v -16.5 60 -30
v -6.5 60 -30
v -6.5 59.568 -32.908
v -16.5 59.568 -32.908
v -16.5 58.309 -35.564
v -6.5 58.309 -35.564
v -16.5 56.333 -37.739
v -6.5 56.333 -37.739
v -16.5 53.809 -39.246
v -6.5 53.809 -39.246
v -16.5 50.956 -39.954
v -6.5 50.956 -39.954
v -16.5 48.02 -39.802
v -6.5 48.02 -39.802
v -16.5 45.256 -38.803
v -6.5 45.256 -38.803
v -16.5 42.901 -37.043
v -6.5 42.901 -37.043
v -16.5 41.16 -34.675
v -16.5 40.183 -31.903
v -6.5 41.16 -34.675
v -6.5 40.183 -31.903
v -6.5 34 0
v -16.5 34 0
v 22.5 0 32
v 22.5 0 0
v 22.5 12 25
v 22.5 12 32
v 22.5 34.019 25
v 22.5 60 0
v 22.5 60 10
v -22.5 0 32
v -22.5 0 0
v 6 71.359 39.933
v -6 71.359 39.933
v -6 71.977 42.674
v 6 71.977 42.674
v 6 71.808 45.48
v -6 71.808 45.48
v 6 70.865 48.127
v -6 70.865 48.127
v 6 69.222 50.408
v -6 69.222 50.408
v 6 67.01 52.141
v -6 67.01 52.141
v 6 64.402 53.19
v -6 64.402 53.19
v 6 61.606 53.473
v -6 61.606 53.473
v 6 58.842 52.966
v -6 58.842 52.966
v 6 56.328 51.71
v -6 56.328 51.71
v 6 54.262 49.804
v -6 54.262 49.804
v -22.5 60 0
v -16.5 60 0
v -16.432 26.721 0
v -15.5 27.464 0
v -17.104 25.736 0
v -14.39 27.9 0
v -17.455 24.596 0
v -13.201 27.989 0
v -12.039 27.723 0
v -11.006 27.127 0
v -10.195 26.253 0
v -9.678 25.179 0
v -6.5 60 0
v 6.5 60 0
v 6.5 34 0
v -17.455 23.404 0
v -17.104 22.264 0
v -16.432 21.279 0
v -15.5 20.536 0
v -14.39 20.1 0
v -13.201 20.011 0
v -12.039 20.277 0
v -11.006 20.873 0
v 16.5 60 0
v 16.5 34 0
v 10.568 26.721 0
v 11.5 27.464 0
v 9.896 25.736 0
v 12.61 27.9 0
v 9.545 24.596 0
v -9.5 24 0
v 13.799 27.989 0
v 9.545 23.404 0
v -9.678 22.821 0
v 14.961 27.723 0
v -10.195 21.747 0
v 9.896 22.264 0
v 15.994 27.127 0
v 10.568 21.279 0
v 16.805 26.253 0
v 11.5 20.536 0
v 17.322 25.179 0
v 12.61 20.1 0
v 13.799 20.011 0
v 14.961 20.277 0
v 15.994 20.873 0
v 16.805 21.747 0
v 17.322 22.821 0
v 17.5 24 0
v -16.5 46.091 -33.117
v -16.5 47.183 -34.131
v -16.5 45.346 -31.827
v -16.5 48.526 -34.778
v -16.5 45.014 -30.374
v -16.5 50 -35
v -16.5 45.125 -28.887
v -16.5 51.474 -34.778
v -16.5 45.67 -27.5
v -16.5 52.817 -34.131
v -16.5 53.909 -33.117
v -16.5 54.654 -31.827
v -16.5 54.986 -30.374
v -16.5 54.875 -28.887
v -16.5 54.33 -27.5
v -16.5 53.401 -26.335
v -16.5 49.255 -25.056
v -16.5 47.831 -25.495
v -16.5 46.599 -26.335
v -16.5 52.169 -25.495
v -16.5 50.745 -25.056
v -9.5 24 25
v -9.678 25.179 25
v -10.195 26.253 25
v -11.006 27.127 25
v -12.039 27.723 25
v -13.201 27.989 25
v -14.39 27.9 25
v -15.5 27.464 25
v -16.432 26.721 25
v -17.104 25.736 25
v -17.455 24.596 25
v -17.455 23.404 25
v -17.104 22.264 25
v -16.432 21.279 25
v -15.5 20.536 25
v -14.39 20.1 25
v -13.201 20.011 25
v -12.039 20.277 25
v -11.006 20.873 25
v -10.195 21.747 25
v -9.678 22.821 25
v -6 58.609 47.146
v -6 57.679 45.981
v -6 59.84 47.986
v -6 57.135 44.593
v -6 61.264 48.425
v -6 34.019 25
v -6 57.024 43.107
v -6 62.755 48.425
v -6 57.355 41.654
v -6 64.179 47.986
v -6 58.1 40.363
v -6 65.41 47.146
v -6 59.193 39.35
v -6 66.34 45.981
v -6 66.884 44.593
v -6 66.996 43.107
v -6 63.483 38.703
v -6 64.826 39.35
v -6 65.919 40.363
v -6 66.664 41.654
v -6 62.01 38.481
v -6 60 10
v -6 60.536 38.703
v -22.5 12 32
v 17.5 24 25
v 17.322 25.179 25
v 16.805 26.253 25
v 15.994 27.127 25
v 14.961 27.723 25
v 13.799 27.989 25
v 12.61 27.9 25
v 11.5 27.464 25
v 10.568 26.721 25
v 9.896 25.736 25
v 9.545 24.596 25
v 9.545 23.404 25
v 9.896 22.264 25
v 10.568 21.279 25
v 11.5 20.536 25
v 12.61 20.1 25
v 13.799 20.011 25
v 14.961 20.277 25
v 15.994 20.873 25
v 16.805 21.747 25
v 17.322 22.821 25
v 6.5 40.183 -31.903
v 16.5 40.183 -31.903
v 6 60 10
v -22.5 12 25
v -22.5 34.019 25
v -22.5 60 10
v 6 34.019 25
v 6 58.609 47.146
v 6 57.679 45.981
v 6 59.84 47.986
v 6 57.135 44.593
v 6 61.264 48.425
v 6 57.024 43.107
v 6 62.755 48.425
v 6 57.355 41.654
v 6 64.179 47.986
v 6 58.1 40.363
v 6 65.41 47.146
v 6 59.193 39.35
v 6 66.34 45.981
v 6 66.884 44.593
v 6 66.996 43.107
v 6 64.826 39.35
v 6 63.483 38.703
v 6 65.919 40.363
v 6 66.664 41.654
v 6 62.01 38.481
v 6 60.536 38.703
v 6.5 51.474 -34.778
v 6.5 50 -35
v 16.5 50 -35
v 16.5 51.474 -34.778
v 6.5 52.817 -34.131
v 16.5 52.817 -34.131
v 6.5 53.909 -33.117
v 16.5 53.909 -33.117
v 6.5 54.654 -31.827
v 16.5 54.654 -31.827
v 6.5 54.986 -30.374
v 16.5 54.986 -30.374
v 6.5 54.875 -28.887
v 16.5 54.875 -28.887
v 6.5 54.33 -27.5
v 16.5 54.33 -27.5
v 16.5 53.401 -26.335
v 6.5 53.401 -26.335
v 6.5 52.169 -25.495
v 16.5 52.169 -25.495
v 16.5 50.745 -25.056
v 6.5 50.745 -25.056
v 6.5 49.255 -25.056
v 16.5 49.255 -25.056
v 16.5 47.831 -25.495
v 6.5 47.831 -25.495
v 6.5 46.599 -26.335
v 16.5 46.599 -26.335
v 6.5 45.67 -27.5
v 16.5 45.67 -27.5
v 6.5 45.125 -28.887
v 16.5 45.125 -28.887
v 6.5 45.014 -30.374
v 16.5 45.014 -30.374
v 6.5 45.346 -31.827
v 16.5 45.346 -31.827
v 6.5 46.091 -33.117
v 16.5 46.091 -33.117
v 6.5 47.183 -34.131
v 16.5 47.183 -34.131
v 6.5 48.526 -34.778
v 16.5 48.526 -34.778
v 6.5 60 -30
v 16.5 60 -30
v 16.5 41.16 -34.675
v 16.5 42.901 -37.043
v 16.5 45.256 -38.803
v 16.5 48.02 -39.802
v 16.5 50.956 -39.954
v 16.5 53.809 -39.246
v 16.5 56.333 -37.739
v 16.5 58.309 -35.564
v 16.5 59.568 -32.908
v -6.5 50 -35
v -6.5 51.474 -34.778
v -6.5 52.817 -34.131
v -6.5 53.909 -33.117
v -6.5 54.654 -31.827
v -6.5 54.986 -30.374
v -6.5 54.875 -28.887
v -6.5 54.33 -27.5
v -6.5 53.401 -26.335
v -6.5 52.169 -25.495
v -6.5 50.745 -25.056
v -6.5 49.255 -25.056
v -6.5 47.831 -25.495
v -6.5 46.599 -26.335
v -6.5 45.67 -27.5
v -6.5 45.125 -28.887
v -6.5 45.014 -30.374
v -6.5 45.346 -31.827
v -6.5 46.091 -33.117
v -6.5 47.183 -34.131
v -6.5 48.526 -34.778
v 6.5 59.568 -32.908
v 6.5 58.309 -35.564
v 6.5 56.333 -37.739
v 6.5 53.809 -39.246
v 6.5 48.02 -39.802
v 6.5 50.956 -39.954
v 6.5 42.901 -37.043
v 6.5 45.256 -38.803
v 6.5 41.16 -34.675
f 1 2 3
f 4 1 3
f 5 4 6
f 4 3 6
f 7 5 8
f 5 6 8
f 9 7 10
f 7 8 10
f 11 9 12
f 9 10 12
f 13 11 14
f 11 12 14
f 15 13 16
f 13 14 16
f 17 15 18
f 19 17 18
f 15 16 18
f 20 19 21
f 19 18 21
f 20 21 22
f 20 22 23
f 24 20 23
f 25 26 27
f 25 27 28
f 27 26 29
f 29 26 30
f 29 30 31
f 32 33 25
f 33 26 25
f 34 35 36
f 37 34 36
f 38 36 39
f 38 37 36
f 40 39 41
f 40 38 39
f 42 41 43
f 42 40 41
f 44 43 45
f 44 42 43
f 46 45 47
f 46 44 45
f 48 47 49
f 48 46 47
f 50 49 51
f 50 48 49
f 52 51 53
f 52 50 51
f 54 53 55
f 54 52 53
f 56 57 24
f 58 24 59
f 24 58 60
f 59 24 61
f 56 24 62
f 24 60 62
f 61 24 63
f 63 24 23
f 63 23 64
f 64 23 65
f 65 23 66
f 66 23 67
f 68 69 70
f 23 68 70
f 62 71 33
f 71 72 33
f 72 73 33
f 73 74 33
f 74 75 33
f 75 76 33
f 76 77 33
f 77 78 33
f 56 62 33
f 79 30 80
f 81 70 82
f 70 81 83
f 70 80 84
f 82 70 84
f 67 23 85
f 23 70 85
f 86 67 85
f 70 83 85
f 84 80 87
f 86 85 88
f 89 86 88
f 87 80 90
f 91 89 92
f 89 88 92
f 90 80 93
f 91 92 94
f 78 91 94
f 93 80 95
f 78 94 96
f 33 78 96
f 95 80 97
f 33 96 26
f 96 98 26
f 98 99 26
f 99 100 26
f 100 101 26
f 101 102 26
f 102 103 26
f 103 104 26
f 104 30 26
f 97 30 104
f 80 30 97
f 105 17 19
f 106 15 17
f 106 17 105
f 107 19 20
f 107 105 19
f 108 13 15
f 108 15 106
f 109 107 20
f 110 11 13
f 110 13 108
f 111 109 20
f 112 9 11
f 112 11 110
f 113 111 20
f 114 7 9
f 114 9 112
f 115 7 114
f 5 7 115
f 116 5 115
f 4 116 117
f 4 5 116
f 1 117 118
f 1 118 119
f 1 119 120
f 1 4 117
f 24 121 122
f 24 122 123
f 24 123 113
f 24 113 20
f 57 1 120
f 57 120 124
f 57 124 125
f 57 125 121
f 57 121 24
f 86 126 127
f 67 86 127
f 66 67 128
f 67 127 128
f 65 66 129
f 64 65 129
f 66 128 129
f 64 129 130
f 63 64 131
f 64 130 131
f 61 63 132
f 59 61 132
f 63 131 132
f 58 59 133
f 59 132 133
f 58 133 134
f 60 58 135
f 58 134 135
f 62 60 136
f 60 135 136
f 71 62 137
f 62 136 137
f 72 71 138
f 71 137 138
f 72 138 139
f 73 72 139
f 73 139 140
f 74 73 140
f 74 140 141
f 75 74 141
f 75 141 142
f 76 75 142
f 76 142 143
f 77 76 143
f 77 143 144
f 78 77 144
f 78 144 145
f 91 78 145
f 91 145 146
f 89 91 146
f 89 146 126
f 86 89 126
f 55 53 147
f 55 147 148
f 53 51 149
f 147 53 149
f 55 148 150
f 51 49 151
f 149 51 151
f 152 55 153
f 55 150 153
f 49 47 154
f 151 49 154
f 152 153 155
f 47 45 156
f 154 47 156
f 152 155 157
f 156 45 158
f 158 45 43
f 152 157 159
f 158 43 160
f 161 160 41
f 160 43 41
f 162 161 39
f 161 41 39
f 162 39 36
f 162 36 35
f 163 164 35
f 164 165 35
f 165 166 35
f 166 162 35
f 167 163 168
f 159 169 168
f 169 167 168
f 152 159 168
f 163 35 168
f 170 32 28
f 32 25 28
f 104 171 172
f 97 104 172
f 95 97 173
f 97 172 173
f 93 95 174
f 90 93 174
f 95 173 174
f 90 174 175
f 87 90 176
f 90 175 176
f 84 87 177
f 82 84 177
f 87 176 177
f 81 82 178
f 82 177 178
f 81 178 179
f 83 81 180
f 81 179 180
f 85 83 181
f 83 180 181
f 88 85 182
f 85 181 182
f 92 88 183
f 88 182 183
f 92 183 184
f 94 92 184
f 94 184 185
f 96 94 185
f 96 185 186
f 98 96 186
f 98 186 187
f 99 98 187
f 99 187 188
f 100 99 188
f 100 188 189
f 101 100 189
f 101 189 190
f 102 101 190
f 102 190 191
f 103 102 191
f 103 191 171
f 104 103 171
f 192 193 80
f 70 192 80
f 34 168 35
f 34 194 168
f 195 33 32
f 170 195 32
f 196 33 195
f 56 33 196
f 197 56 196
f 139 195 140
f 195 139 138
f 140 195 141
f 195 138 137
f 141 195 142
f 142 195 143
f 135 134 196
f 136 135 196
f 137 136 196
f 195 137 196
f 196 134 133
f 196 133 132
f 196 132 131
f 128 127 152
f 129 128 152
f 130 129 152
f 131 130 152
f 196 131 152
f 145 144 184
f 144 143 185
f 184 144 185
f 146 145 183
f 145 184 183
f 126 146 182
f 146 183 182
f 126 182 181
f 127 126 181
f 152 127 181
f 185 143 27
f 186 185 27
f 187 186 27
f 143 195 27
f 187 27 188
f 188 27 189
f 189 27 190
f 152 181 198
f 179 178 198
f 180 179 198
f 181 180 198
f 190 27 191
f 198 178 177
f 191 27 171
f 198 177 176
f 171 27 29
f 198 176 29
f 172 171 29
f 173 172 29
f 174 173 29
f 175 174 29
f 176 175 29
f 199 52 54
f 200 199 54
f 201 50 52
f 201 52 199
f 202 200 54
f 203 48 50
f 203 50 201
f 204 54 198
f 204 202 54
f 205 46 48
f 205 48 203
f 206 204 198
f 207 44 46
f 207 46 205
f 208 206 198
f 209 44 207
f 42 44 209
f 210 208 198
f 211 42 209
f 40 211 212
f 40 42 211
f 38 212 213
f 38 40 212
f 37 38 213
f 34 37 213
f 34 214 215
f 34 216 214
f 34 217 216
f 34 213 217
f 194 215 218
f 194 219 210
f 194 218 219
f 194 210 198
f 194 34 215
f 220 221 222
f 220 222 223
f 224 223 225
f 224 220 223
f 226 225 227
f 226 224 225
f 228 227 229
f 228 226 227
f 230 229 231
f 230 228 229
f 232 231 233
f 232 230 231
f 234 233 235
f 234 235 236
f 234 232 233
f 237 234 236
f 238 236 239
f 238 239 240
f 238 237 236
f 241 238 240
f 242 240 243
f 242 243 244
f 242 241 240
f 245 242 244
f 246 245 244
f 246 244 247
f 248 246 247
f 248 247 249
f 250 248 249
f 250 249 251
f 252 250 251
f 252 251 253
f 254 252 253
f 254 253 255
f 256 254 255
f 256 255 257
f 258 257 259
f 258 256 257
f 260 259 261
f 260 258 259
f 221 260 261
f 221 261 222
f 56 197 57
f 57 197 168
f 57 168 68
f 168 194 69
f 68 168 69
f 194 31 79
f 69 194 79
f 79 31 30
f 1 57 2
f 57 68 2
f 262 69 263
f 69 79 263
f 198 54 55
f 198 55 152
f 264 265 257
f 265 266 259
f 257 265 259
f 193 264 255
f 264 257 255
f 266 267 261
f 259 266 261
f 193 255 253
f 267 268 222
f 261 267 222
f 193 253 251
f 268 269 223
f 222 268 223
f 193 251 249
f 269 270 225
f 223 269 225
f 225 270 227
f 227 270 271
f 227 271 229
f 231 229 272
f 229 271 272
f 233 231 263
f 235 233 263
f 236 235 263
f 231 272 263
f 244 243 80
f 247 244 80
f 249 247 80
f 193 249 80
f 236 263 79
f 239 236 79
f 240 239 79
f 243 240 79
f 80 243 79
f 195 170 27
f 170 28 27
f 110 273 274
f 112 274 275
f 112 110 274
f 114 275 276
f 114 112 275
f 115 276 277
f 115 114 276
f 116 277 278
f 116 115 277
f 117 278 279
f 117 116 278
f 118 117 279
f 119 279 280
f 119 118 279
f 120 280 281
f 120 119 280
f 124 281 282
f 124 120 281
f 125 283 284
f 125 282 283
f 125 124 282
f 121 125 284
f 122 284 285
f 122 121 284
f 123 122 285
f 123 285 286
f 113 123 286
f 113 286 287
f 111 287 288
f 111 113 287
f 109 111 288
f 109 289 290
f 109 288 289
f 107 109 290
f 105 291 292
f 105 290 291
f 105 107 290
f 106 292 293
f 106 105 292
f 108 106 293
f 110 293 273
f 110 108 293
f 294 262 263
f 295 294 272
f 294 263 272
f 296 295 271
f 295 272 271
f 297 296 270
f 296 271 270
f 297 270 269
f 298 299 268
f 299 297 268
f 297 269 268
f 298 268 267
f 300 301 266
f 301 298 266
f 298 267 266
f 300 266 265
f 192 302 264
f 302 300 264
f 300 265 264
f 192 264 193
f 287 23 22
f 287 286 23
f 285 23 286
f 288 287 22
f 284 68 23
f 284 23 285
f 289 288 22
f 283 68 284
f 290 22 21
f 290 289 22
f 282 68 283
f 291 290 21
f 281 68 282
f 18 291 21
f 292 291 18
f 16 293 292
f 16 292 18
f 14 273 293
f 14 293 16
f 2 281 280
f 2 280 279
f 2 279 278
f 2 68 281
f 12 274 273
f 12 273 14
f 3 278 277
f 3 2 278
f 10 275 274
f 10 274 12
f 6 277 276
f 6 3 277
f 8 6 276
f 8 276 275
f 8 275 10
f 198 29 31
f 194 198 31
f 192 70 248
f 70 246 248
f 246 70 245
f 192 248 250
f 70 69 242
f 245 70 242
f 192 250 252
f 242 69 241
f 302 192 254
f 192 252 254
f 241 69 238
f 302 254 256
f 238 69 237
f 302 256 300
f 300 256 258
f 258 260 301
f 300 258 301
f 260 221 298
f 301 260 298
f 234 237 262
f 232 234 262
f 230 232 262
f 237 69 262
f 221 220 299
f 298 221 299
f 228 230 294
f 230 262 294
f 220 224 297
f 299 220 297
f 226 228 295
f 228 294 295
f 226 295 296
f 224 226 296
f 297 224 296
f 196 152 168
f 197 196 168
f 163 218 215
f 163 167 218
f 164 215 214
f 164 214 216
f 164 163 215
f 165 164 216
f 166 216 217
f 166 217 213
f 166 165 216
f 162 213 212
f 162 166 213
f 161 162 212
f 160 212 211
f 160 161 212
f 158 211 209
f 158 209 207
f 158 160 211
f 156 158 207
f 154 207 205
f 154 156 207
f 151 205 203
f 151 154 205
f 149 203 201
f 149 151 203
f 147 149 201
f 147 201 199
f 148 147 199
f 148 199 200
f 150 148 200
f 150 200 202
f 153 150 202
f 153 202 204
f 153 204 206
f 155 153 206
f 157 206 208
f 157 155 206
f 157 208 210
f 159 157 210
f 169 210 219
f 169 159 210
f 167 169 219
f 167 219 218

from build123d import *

# Parameters (mm, degrees)
BOSS_EXTRUDE1_DEPTH = 22.5
SKETCH2_R           = 5
BOSS_EXTRUDE2_DEPTH = 16.5
SKETCH3_W           = 13
SKETCH3_H           = 52.478254128
CUT_EXTRUDE1_DEPTH  = 76.539724649
SKETCH4_R           = 5
BOSS_EXTRUDE3_DEPTH = 6
SKETCH5_R           = 4
CUT_EXTRUDE2_DEPTH  = 100.582303751


with BuildPart() as part:
    # Sketch1 → Boss-Extrude1 (new, symmetric)
    with BuildSketch(Plane(origin=(0, 0, 0), x_dir=(0, 0, -1), z_dir=(1, 0, 0))):
        Polygon((0, 60), (0, 0), (-32, 0), (-32, 12), (-25, 12), (-25, 34.019237886), (-10, 60), align=None)
    extrude(amount=BOSS_EXTRUDE1_DEPTH, both=True)

    # Sketch2 → Boss-Extrude2 (add, symmetric)
    with BuildSketch(Plane(origin=(0, 0, 0), x_dir=(0, 0, -1), z_dir=(1, 0, 0))):
        with BuildLine():
            Line((0, 60), (30, 60))
            ThreePointArc((30, 60), (39.954230484, 50.95566494), (31.902581816, 40.182659096))
            Line((31.902581816, 40.182659096), (0, 34))
            Line((0, 34), (0, 60))
        make_face()
        with Locations((30, 50)):
            Circle(SKETCH2_R, mode=Mode.SUBTRACT)
    extrude(amount=BOSS_EXTRUDE2_DEPTH, both=True)

    # Sketch3 → Cut-Extrude1 (cut, through all)
    with BuildSketch(Plane(origin=(0, 60, 0), x_dir=(1, 0, 0), z_dir=(0, 1, 0))):
        with Locations((0, 26.239127064)):
            Rectangle(SKETCH3_W, SKETCH3_H)
    extrude(amount=-CUT_EXTRUDE1_DEPTH, mode=Mode.SUBTRACT)

    # Sketch4 → Boss-Extrude3 (add, symmetric)
    with BuildSketch(Plane(origin=(0, 0, 0), x_dir=(0, 0, -1), z_dir=(1, 0, 0))):
        with BuildLine():
            Line((-10, 60), (-39.932790381, 71.359051898))
            ThreePointArc((-39.932790381, 71.359051898), (-52.141016151, 67.009618943), (-49.803622697, 54.262268813))
            Line((-49.803622697, 54.262268813), (-25, 34.019237886))
            Line((-25, 34.019237886), (-10, 60))
        make_face()
        with Locations((-43.480762114, 62.009618943)):
            Circle(SKETCH4_R, mode=Mode.SUBTRACT)
    extrude(amount=BOSS_EXTRUDE3_DEPTH, both=True)

    # Sketch5 → Cut-Extrude2 (cut, through all)
    with BuildSketch(Plane.XY.offset(25)):
        with Locations((-13.5, 24)):
            Circle(SKETCH5_R)
        with Locations((13.5, 24)):
            Circle(SKETCH5_R)
    extrude(amount=-CUT_EXTRUDE2_DEPTH, mode=Mode.SUBTRACT)


solid = part.part
